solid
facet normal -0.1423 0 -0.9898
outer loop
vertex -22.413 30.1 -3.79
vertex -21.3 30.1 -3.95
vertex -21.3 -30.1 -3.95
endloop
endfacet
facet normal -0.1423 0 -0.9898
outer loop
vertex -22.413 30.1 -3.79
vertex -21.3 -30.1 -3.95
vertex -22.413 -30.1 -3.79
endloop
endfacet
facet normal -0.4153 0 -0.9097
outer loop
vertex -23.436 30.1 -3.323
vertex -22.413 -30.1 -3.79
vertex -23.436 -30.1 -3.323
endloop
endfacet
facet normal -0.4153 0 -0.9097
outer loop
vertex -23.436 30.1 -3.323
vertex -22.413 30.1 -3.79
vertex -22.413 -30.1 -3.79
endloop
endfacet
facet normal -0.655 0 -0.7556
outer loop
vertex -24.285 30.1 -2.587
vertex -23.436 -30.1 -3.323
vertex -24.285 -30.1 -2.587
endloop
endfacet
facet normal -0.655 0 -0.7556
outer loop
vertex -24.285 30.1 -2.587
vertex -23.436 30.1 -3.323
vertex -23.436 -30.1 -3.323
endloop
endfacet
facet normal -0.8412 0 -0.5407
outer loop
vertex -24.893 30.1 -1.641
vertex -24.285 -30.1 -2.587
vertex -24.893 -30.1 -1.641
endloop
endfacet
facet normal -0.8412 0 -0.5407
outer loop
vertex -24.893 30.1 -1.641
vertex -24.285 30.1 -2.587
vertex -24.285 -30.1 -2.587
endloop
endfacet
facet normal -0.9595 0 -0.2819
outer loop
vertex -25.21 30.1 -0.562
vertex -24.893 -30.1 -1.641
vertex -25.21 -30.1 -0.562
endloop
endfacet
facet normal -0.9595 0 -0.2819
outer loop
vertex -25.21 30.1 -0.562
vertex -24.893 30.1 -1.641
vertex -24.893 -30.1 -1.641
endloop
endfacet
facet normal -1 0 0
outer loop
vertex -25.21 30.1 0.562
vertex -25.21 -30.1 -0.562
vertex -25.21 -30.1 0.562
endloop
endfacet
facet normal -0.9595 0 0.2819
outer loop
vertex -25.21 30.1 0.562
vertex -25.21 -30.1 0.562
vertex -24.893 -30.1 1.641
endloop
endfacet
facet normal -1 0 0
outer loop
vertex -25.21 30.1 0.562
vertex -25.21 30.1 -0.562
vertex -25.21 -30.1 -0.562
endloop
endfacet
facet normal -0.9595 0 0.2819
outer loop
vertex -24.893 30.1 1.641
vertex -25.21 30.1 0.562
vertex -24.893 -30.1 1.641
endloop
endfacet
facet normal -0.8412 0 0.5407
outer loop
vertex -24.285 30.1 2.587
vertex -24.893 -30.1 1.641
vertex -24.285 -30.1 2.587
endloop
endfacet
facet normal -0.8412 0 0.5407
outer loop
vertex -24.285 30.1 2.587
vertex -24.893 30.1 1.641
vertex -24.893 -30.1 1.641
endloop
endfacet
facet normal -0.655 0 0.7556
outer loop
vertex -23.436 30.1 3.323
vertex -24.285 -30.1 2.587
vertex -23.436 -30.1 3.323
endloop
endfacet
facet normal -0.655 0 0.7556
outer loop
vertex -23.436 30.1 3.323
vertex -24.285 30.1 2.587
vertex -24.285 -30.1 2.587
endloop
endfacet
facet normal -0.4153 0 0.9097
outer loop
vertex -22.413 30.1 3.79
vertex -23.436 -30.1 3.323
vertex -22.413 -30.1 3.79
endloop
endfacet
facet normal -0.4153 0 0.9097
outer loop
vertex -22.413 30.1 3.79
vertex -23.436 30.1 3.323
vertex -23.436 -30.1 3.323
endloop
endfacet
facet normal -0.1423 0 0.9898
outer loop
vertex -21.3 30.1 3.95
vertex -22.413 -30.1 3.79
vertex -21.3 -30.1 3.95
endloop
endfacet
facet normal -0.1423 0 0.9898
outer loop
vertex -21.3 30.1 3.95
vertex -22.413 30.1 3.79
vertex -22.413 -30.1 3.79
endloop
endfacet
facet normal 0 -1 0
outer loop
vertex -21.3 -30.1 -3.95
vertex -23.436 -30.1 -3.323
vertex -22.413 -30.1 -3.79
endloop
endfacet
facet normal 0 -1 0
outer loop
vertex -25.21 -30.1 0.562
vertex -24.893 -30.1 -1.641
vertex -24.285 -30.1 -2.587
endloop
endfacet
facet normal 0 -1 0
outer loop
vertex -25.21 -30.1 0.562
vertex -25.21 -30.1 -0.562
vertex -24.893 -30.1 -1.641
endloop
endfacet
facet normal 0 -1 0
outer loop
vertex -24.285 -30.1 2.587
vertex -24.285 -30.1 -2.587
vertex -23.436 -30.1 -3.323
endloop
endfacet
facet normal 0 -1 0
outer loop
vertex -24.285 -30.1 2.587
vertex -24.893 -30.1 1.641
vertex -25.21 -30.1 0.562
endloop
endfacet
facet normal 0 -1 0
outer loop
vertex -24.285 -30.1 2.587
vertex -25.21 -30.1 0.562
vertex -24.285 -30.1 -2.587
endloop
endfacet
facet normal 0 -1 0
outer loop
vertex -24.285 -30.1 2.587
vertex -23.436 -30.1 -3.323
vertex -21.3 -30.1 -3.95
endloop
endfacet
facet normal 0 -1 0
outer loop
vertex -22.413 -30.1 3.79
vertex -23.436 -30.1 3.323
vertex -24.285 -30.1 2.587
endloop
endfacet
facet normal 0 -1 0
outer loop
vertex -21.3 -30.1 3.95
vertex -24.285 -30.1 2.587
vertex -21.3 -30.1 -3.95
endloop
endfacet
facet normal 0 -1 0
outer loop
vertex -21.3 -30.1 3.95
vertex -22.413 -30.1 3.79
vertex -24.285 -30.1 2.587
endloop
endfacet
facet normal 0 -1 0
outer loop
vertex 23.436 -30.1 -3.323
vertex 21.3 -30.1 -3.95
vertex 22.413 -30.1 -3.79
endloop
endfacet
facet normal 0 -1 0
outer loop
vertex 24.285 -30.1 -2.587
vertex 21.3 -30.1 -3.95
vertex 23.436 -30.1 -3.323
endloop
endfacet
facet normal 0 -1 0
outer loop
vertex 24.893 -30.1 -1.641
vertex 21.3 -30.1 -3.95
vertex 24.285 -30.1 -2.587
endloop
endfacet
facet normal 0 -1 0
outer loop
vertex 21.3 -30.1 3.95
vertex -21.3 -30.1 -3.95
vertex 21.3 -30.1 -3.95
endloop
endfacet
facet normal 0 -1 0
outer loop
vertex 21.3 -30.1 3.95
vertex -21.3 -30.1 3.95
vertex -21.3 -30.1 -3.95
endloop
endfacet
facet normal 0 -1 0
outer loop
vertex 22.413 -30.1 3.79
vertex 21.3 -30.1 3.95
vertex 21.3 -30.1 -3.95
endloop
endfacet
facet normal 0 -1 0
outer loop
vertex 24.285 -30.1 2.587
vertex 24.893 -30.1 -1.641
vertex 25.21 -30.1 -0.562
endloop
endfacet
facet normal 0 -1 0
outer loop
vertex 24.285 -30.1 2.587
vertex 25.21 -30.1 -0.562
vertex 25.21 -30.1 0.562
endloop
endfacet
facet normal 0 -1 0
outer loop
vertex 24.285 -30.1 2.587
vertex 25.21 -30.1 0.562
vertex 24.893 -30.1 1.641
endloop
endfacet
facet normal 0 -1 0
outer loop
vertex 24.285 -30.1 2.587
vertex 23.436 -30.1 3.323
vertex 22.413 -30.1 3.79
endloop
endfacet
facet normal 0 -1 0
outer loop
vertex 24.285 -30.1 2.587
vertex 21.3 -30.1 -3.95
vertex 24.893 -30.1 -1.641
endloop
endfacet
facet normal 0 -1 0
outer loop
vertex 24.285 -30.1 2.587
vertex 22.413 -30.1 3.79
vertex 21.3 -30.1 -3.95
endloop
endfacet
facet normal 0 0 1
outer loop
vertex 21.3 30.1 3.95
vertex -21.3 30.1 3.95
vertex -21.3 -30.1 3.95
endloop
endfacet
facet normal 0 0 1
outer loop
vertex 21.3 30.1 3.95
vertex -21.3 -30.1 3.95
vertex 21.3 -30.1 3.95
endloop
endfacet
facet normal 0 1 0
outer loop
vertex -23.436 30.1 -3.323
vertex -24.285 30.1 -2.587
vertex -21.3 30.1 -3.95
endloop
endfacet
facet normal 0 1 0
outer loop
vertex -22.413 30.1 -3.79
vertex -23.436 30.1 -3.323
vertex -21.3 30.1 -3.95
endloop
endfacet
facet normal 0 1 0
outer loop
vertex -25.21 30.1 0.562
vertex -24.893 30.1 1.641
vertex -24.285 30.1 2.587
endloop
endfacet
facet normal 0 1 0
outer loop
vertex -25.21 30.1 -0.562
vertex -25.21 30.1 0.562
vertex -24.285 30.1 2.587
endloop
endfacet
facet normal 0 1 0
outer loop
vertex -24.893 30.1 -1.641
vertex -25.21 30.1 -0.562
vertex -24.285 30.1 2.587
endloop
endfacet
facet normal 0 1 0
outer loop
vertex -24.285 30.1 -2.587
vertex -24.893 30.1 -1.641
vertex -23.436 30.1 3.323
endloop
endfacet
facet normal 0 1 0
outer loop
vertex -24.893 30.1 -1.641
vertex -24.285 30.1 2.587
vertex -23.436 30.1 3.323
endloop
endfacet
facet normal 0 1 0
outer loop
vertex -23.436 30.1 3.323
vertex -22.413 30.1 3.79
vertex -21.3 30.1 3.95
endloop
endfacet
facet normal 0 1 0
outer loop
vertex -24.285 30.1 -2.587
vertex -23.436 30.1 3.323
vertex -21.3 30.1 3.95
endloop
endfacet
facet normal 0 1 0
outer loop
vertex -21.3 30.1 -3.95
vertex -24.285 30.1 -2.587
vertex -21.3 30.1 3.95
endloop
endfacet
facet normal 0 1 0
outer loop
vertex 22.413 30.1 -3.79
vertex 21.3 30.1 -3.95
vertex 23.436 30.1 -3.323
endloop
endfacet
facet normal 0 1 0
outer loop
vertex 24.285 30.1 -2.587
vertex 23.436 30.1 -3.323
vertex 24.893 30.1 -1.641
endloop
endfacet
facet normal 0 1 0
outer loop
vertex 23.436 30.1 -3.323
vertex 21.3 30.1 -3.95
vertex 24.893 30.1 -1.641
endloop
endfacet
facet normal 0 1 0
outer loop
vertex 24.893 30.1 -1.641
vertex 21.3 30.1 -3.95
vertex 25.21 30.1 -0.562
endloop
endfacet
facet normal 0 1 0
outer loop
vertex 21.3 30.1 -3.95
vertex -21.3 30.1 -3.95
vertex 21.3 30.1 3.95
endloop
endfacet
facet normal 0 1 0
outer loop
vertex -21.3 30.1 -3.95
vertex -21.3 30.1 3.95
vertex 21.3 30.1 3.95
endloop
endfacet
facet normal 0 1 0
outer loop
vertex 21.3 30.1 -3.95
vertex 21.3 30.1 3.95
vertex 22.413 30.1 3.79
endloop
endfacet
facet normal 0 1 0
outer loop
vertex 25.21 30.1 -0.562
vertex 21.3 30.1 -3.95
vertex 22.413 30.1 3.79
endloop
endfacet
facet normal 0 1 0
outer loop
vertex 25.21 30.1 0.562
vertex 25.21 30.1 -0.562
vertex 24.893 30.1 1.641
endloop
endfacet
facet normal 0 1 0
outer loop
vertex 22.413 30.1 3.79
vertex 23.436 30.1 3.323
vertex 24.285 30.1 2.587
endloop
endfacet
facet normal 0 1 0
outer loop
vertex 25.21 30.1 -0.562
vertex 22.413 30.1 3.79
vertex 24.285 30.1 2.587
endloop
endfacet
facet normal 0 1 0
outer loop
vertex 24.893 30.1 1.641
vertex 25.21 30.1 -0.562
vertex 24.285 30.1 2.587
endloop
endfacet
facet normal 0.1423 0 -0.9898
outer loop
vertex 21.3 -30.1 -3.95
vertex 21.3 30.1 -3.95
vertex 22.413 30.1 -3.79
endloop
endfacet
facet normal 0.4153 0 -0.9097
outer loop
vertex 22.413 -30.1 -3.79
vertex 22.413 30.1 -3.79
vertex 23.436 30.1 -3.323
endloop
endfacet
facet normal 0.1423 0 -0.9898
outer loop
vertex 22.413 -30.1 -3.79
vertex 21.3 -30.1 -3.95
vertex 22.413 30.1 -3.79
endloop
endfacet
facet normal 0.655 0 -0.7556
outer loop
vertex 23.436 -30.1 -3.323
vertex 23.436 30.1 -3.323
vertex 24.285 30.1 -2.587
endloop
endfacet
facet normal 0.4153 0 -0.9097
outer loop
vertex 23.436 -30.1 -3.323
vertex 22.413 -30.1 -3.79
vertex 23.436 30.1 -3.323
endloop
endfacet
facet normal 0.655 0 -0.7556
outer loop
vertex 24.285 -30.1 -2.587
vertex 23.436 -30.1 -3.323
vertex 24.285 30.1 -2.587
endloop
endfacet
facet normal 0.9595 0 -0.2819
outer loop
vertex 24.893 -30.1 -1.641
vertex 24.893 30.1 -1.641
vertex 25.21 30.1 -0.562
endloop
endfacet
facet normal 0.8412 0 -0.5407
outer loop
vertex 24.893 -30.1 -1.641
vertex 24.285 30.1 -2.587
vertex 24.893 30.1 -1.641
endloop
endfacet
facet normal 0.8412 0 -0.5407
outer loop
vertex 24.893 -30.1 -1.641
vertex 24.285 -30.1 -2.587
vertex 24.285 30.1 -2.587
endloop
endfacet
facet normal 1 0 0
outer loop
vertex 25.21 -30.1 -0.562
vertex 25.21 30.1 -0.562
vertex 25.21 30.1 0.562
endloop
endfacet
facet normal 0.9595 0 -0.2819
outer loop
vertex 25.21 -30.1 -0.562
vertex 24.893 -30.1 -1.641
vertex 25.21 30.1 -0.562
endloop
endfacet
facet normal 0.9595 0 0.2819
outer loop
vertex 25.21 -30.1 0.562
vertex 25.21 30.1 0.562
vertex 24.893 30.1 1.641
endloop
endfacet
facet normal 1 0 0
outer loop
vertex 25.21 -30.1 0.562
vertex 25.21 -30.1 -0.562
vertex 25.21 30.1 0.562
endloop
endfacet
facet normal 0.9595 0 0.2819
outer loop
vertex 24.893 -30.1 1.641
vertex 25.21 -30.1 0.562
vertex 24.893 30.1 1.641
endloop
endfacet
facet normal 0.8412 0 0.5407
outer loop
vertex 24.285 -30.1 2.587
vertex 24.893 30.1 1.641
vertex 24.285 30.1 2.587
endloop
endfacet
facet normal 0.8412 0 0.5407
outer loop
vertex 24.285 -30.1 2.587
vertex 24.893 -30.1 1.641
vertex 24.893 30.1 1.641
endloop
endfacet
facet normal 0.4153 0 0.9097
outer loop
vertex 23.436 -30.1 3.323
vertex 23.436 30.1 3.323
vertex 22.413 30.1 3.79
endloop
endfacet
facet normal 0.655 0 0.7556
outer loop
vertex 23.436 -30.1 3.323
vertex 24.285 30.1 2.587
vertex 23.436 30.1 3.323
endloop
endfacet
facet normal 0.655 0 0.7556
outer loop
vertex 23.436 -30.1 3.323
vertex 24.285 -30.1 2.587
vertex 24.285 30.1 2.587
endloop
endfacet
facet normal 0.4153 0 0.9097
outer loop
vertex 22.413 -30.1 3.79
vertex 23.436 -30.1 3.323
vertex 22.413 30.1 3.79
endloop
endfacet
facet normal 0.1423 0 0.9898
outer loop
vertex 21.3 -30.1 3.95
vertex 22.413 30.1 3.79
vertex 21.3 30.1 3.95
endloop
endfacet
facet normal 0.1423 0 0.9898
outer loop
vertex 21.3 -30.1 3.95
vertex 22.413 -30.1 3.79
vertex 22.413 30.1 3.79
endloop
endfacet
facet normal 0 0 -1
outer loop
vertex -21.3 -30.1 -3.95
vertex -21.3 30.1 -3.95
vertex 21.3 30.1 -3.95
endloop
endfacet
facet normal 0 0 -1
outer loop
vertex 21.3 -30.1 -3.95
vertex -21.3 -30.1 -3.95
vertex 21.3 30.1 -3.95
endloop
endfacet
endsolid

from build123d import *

# Parameters (mm, degrees)
SKETCH1_W           = 50.5
SKETCH1_H           = 60.2
BOSS_EXTRUDE1_DEPTH = 3.95
FILLET1_RADIUS      = 3.95
FILLET1_LENGTH      = 60.2
FILLET2_RADIUS      = 3.95
FILLET2_LENGTH      = 60.2


with BuildPart() as part:
    # Sketch1 → Boss-Extrude1 (new, symmetric)
    with BuildSketch(Plane.XY):
        Rectangle(SKETCH1_W, SKETCH1_H)
    extrude(amount=BOSS_EXTRUDE1_DEPTH, both=True)

    # Fillet1: full round fillet: the end face becomes a half cylinder, R = half its width
    fillet1_face = Plane((-25.25, 0, 0), x_dir=(0, 1, 0), z_dir=(-1, 0, 0))  # on the end face: x along it, z out of the body
    fillet1_slab = fillet1_face.offset(-FILLET1_RADIUS / 2) * Box(FILLET1_LENGTH, 2 * FILLET1_RADIUS, FILLET1_RADIUS, mode=Mode.PRIVATE)  # the body's end, R deep
    fillet1_round = Plane((-21.3, 0, 0), x_dir=(-1, 0, 0), z_dir=(0, 1, 0)) * Cylinder(FILLET1_RADIUS, FILLET1_LENGTH, mode=Mode.PRIVATE)  # its axis R under the face
    add(fillet1_slab - fillet1_round, mode=Mode.SUBTRACT)

    # Fillet2: full round fillet: the end face becomes a half cylinder, R = half its width
    fillet2_face = Plane((25.25, 0, 0), x_dir=(0, -1, 0), z_dir=(1, 0, 0))  # on the end face: x along it, z out of the body
    fillet2_slab = fillet2_face.offset(-FILLET2_RADIUS / 2) * Box(FILLET2_LENGTH, 2 * FILLET2_RADIUS, FILLET2_RADIUS, mode=Mode.PRIVATE)  # the body's end, R deep
    fillet2_round = Plane((21.3, 0, 0), x_dir=(1, 0, 0), z_dir=(0, -1, 0)) * Cylinder(FILLET2_RADIUS, FILLET2_LENGTH, mode=Mode.PRIVATE)  # its axis R under the face
    add(fillet2_slab - fillet2_round, mode=Mode.SUBTRACT)


solid = part.part
